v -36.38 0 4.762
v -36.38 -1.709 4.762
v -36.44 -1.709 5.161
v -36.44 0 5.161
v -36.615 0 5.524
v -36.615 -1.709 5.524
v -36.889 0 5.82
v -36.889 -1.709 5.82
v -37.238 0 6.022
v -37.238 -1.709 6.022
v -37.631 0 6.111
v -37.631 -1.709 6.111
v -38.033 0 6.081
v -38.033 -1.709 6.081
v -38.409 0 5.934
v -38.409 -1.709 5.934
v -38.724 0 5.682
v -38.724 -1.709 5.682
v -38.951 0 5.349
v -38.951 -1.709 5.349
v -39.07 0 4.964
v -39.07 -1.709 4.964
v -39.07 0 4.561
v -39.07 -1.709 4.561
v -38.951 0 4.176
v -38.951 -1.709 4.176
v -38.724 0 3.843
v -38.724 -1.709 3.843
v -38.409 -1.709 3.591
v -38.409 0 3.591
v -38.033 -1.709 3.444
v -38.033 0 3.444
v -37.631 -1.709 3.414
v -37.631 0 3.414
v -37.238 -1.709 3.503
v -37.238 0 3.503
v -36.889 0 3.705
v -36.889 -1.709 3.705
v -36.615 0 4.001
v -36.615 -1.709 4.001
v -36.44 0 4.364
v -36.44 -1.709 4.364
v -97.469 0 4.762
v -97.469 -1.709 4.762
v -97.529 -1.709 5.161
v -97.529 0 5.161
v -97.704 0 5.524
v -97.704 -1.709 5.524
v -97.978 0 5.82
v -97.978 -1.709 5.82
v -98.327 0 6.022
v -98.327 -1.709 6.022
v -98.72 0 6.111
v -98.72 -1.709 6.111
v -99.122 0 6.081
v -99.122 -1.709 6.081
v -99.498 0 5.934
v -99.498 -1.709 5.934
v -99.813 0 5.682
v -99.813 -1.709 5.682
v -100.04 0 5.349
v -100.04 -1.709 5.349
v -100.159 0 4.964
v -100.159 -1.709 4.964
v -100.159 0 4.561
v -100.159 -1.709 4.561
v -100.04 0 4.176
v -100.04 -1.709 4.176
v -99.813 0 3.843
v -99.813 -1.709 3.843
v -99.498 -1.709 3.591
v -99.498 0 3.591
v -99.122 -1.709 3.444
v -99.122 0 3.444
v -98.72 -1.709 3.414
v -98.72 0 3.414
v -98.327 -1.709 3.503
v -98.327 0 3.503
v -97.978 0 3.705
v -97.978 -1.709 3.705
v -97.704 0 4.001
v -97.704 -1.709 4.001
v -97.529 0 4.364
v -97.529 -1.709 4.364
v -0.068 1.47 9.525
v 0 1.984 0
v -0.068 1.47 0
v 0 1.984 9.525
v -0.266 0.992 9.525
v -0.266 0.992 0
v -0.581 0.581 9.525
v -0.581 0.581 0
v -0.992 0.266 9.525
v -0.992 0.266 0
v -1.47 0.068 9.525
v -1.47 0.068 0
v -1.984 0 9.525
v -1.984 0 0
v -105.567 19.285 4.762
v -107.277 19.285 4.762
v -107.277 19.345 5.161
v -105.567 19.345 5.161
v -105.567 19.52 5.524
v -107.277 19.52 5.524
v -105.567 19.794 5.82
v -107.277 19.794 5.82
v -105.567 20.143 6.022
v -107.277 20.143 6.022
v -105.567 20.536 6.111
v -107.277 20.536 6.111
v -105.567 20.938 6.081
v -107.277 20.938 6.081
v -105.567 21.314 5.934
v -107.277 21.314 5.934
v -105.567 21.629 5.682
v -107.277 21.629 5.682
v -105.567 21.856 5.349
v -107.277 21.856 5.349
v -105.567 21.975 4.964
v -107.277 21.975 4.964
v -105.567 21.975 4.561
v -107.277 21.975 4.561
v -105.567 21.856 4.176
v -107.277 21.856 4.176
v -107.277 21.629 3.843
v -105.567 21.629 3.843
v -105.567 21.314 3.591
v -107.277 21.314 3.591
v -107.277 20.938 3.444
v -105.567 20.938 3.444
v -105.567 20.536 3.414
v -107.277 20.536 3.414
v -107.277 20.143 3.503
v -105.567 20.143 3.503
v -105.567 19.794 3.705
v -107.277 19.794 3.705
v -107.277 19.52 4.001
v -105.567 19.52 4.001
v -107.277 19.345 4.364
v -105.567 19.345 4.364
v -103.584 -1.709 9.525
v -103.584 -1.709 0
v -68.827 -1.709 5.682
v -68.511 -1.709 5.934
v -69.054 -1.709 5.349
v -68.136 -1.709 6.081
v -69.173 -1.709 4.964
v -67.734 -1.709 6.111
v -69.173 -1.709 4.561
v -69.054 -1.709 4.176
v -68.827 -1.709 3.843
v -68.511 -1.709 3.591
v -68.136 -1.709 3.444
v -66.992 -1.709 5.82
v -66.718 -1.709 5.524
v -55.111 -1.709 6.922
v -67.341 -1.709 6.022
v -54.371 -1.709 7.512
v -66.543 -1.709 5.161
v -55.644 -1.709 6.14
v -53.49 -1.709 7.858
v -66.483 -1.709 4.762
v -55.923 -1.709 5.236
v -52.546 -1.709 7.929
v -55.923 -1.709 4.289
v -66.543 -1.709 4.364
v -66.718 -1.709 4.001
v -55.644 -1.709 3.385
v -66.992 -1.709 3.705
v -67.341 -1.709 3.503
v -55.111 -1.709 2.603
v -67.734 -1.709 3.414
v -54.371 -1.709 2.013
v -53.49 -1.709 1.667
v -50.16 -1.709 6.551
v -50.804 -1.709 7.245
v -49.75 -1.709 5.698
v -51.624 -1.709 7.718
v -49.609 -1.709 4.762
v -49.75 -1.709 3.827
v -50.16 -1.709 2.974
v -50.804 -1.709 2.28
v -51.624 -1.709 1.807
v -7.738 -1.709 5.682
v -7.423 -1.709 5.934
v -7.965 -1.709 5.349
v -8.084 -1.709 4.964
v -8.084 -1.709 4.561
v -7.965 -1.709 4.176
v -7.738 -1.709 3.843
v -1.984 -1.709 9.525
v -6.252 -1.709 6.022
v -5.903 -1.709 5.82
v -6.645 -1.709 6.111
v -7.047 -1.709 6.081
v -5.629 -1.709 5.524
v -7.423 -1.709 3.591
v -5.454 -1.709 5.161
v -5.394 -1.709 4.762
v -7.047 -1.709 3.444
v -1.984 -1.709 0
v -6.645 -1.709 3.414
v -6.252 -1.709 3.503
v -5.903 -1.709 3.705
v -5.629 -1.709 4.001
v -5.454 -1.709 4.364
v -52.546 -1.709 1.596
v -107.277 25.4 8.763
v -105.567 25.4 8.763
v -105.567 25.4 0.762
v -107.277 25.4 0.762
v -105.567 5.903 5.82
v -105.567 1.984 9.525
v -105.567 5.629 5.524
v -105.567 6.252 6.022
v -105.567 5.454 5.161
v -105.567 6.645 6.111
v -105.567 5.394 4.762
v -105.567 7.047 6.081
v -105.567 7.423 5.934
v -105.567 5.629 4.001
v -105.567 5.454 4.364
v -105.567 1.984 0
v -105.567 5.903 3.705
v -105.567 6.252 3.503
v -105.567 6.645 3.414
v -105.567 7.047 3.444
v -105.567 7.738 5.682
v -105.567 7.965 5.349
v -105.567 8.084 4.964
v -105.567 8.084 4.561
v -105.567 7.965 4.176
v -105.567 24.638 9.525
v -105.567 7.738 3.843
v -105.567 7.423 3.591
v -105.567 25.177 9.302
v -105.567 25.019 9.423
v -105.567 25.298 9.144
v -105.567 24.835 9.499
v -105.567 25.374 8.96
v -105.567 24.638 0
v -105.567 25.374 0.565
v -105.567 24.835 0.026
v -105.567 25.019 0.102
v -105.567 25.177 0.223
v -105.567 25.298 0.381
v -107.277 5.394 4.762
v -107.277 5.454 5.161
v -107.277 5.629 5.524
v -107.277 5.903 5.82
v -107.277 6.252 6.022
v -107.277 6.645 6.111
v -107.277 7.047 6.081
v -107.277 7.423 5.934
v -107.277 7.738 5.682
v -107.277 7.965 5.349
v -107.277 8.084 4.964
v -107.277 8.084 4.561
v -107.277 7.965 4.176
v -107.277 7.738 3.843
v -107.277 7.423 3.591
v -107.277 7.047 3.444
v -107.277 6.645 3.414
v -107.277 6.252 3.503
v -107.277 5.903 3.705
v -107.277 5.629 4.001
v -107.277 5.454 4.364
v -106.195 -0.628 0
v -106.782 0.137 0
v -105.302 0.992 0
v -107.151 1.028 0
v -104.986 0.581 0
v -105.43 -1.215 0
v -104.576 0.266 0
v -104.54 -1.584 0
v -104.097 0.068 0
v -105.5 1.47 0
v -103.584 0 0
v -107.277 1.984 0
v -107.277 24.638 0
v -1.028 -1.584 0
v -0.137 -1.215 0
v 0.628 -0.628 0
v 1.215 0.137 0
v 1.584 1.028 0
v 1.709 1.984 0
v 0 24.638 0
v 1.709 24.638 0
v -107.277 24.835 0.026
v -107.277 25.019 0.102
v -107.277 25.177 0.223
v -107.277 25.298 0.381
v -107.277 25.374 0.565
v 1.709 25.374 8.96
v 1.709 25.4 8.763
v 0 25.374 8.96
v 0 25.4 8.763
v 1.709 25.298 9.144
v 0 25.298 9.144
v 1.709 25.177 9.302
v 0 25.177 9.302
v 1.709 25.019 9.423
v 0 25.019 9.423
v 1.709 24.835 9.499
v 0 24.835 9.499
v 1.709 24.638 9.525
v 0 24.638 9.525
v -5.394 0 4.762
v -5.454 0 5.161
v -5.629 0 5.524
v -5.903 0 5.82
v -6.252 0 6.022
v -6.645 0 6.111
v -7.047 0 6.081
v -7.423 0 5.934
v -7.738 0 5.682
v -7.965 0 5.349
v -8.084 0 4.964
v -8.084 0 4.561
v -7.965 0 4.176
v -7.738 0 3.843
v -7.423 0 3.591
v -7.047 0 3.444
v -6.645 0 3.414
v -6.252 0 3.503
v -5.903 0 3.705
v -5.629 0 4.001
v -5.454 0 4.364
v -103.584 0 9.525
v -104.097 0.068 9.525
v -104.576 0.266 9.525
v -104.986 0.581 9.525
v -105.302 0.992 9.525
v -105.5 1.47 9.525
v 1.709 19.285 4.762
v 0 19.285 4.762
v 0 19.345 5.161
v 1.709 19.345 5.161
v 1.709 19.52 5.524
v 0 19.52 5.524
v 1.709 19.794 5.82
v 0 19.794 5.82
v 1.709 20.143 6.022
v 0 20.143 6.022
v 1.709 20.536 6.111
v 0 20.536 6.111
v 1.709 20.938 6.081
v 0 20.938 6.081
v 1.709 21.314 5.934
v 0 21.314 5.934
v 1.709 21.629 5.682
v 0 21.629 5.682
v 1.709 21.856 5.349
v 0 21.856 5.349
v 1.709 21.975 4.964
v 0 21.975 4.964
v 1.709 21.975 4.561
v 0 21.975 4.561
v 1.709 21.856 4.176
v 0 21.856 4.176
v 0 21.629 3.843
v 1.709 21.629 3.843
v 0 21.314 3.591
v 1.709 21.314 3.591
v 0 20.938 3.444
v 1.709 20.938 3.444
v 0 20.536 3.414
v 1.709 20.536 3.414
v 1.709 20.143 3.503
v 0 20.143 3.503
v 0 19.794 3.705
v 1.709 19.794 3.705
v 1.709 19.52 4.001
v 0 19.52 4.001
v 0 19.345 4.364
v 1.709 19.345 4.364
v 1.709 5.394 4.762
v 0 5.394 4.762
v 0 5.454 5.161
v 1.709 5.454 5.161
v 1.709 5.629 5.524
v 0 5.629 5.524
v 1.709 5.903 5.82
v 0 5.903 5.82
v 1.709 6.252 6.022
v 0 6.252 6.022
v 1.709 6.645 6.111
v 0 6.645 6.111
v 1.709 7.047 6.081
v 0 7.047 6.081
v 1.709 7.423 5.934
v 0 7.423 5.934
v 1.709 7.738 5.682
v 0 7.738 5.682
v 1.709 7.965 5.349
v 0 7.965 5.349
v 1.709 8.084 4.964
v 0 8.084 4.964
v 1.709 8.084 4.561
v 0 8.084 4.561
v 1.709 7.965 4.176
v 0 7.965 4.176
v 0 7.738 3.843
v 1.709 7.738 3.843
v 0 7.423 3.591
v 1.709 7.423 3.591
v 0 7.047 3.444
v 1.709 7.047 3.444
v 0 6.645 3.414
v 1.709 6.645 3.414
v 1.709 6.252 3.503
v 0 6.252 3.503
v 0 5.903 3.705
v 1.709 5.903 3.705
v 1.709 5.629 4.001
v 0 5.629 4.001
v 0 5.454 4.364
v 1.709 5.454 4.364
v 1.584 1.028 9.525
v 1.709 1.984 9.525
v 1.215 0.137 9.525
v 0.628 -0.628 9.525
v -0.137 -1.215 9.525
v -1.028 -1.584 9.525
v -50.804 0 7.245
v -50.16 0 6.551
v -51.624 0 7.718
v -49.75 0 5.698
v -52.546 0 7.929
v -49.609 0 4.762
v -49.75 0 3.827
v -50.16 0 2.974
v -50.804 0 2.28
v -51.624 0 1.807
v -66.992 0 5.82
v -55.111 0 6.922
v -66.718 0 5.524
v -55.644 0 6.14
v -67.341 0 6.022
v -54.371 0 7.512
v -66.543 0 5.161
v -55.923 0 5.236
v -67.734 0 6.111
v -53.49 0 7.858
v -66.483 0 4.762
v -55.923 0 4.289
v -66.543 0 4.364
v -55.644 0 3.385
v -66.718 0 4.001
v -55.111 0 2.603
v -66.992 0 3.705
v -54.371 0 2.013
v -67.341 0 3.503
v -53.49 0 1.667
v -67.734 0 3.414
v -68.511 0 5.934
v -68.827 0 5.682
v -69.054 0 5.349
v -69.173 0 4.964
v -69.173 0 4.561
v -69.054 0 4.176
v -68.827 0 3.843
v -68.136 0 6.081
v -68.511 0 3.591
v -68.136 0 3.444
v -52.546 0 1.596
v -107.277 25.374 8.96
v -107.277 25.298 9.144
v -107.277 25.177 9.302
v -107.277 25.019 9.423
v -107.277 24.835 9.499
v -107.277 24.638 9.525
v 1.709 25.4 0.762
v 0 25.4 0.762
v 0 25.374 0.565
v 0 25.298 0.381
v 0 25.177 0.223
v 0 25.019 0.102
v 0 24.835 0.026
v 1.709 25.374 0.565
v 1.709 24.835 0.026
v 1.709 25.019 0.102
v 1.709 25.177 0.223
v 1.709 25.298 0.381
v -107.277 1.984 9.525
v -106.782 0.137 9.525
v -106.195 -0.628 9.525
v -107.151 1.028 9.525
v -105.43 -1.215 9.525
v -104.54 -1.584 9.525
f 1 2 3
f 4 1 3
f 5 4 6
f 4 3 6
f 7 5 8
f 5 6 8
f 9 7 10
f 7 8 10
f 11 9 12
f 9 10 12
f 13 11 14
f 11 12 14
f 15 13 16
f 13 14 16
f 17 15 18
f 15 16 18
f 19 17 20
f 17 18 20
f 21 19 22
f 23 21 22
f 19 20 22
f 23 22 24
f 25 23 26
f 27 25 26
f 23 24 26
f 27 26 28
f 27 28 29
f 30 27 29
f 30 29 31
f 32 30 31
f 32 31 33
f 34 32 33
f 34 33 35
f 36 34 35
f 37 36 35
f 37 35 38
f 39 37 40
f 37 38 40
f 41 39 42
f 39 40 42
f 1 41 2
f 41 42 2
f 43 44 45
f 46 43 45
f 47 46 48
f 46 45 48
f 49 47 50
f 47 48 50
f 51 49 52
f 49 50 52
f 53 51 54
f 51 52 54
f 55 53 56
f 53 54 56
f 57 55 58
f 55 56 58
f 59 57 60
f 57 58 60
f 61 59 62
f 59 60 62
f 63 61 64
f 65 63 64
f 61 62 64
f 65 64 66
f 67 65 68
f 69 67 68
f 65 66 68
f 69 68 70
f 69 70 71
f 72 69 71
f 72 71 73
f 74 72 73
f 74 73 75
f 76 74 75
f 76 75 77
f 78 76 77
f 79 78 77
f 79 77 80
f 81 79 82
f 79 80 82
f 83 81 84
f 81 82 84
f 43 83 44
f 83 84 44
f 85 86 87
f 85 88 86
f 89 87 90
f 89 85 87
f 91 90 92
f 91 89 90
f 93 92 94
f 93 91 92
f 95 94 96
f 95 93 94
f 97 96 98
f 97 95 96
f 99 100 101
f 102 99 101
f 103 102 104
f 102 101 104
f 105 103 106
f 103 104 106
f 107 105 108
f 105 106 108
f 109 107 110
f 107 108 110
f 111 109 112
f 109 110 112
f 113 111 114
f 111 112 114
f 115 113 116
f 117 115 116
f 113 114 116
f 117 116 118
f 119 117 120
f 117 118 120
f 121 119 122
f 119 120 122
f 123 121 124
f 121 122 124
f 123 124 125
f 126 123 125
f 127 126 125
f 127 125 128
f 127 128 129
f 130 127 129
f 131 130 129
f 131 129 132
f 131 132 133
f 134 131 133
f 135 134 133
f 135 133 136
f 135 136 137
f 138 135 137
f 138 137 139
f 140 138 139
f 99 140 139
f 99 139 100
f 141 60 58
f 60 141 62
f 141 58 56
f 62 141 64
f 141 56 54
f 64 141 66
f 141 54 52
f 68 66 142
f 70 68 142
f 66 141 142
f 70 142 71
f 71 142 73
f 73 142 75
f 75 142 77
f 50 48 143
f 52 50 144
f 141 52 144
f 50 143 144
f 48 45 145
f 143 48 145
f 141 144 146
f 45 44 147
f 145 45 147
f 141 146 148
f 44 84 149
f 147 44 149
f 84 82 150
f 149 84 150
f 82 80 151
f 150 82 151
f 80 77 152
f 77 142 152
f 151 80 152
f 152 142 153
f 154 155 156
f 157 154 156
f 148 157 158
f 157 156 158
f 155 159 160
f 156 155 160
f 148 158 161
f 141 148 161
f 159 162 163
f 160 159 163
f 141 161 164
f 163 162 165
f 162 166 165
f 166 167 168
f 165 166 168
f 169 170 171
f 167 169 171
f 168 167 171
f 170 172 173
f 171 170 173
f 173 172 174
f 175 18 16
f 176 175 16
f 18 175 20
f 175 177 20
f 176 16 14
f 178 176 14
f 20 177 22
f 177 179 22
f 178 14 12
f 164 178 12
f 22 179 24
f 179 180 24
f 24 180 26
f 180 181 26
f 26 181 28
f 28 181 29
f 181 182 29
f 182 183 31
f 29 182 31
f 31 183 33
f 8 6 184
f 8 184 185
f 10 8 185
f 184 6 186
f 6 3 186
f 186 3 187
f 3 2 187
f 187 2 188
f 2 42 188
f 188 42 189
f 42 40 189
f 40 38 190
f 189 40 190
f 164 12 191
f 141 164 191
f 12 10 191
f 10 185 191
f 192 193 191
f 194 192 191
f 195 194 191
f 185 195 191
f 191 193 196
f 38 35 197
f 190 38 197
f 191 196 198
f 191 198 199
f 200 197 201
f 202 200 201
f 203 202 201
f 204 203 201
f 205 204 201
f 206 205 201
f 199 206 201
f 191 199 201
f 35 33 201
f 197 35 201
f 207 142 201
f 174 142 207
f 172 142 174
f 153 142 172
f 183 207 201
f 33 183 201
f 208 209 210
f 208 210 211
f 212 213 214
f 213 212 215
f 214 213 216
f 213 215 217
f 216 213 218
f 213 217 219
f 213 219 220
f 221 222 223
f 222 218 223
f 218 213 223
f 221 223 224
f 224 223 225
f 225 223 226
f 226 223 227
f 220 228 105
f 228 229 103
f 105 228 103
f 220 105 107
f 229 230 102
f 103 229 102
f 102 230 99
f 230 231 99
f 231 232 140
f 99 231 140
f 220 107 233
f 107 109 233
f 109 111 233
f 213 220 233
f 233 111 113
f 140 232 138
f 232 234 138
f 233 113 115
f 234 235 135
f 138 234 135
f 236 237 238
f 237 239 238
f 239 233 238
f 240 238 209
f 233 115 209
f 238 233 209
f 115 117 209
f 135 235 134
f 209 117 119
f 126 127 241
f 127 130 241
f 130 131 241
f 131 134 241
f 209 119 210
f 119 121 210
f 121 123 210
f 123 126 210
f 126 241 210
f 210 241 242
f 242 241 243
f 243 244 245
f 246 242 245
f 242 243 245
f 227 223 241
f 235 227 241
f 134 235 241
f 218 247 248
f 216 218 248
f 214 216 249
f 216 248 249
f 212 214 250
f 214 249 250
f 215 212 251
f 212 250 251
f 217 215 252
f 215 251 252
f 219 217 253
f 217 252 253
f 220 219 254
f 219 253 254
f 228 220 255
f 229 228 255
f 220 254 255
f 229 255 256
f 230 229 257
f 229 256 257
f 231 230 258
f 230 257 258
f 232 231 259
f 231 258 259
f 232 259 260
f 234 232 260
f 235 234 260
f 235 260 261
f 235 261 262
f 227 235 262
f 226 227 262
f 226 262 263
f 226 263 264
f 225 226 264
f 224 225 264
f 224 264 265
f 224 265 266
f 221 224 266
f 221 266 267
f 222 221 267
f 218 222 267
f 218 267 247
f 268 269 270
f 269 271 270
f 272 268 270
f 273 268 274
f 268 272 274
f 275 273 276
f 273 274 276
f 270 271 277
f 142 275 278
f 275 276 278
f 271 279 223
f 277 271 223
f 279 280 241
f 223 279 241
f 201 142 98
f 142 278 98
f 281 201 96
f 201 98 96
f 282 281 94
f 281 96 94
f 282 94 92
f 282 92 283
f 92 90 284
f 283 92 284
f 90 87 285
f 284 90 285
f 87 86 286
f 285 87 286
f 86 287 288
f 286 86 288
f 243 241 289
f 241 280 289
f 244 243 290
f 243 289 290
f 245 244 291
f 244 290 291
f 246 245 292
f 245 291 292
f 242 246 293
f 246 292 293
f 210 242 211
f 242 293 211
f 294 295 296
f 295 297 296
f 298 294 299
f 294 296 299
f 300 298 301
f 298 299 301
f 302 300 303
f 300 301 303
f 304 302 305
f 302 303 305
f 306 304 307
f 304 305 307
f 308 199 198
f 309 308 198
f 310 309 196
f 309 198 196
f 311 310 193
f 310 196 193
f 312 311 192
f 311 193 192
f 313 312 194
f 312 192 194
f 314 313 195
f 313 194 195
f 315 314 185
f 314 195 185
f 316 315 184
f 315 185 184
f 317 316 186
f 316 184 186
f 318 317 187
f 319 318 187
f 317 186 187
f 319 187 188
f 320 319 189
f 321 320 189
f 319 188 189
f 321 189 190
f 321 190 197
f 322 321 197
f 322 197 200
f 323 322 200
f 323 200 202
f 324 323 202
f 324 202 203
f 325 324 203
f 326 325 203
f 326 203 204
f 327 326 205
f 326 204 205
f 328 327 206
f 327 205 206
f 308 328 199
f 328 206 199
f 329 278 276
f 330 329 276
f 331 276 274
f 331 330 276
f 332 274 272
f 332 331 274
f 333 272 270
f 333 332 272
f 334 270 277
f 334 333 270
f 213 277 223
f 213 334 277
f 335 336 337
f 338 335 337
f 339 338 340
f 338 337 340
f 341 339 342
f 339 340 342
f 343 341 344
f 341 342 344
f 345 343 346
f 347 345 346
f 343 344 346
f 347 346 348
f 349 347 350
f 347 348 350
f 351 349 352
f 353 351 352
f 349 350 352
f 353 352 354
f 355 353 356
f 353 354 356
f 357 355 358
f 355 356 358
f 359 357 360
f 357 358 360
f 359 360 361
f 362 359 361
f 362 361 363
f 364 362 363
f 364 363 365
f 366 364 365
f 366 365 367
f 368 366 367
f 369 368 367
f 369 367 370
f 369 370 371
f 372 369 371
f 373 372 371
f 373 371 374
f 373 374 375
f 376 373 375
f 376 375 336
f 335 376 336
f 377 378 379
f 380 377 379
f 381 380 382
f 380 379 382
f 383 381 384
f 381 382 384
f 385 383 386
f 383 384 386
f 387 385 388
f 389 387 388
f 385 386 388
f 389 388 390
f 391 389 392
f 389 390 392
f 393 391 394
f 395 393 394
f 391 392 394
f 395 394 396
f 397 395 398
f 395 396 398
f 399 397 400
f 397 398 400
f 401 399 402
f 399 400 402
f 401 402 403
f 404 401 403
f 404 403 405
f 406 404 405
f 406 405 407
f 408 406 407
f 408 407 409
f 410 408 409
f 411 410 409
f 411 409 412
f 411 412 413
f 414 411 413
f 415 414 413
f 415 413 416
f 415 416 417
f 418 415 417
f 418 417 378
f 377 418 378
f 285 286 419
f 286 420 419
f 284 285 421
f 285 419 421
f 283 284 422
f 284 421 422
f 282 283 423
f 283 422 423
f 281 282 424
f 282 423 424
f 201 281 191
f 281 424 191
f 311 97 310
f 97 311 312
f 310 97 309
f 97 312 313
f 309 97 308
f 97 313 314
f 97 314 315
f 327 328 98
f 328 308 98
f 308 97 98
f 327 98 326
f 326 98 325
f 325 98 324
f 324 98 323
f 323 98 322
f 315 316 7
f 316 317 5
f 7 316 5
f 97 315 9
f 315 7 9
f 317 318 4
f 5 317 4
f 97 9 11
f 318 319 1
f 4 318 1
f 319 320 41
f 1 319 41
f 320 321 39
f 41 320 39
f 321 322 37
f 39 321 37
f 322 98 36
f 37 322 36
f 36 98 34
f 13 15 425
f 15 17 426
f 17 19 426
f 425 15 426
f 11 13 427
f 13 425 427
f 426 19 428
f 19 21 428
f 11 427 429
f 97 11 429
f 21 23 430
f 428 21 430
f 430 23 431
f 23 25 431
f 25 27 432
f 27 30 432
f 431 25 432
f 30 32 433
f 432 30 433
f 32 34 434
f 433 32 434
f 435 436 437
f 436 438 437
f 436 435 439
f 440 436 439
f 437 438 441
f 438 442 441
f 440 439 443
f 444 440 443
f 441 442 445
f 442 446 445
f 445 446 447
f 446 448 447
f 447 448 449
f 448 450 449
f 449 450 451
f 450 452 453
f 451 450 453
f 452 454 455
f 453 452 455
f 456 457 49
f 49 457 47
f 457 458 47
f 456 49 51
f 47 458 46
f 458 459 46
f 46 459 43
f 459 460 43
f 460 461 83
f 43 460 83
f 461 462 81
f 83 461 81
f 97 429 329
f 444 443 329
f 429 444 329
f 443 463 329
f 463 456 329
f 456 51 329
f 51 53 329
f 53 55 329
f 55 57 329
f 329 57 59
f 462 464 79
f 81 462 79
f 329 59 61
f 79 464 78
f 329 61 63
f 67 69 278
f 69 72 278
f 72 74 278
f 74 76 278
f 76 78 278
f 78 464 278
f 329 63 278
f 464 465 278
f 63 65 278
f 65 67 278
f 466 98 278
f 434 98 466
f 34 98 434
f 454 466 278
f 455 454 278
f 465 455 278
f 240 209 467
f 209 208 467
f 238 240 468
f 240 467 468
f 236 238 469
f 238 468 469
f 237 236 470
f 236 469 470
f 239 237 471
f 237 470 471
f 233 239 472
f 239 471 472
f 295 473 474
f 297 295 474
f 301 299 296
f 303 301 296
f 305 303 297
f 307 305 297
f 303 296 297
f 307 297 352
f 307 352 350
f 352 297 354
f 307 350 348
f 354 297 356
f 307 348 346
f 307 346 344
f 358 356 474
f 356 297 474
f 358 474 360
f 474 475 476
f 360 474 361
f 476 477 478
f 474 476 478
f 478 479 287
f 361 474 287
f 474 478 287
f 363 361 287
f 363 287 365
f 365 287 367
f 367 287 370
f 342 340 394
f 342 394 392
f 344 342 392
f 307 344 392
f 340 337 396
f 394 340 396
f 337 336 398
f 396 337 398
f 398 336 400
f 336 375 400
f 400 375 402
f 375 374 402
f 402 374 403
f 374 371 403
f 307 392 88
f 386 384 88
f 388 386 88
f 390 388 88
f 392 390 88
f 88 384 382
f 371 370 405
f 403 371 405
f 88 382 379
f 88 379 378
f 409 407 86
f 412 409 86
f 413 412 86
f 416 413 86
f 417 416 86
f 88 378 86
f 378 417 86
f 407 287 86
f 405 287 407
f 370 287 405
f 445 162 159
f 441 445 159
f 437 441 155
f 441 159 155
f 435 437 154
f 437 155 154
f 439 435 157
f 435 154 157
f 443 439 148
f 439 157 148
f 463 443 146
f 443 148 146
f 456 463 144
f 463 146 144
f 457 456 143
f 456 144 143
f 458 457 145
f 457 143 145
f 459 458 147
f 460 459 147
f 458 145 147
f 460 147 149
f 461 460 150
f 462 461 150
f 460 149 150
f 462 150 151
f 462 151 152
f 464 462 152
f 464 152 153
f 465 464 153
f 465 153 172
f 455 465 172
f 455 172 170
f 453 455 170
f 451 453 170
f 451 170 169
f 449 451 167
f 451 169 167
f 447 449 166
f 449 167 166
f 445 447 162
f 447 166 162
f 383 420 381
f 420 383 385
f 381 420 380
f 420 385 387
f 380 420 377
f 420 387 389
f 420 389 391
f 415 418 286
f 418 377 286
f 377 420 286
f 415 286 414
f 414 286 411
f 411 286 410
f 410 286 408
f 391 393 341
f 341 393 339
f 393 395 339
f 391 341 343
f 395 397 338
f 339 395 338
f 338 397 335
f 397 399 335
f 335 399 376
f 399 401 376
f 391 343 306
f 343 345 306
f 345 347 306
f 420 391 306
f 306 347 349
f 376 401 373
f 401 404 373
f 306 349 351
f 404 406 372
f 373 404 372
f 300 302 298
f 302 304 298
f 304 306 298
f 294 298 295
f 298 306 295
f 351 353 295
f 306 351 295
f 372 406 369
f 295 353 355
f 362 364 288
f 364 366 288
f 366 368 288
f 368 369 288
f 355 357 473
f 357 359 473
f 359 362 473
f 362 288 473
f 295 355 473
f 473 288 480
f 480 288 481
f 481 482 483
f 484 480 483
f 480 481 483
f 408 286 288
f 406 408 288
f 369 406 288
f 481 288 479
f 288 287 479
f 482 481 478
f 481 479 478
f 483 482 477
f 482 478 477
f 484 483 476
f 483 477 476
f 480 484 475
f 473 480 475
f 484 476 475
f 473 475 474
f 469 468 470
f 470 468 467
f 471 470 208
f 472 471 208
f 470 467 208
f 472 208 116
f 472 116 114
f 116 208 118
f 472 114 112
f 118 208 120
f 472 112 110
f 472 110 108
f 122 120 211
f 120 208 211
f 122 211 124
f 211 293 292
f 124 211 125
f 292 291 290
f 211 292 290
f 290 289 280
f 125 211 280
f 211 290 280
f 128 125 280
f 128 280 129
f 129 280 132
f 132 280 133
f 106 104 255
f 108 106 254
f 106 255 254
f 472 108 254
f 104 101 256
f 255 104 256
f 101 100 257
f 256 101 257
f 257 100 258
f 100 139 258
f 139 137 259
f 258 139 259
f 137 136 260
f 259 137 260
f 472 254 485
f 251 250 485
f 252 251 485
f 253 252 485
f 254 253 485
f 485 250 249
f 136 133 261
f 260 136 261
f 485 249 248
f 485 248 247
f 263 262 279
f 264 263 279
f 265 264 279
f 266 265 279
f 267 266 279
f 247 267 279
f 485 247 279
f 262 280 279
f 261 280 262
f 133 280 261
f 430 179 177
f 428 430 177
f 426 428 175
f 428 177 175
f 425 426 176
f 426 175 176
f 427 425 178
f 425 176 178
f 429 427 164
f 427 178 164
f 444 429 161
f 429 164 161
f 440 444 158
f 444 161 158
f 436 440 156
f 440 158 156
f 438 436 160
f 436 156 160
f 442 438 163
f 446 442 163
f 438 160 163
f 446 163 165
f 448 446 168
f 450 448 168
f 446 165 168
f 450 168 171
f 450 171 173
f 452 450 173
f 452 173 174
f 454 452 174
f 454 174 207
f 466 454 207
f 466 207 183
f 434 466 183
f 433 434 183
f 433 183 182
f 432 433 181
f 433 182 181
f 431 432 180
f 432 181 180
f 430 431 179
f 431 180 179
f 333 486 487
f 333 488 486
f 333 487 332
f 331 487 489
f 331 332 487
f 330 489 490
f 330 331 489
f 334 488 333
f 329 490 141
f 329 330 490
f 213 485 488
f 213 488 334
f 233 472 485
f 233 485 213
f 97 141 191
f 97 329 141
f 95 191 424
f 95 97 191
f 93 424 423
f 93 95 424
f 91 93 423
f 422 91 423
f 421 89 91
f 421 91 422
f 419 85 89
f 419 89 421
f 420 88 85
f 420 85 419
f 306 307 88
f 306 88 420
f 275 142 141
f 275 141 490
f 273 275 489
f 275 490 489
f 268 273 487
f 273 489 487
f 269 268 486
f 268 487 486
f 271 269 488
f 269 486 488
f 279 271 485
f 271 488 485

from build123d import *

# Parameters (mm, degrees)
F1_DEPTH = 9.525
F2_R     = 1.98374
F3_R     = 3.69316
F4_R     = 1.35255
F5_DEPTH = 108.98632
F6_R     = 1.35255
F6_R_2   = 3.175
F7_DEPTH = 1.70942
F8_R     = 0.762


with BuildPart() as f1:
    # F0 (on Top) → F1 (new body)
    with BuildSketch(Plane.XY):
        Polygon((0, 25.4), (0, 0), (-105.56748, 0), (-105.56748, 25.4), (-107.2769, 25.4), (-107.2769, -1.70942), (1.70942, -1.70942), (1.70942, 25.4), align=None)
    extrude(amount=F1_DEPTH)

    # F2
    f2_edges = [f1.edges().sort_by_distance(p)[0] for p in [
        (0, 0, 4.7625),
        (-105.56748, 0, 4.7625),
    ]]
    fillet(f2_edges, radius=F2_R)

    # F3
    f3_edges = [f1.edges().sort_by_distance(p)[0] for p in [
        (1.70942, -1.70942, 4.7625),
        (-107.2769, -1.70942, 4.7625),
    ]]
    fillet(f3_edges, radius=F3_R)

    # F4 (on face) → F5 (cut, through all)
    with BuildSketch(Plane(origin=(-107.2769, 0, 0), x_dir=(0, -1, 0), z_dir=(-1, 0, 0))):
        with Locations((-20.6375, 4.7625)):
            Circle(F4_R)
        with Locations((-6.74624, 4.7625)):
            Circle(F4_R)
    extrude(amount=-F5_DEPTH, mode=Mode.SUBTRACT)

    # F6 (on face) → F7 (cut, through all)
    with BuildSketch(Plane.XZ.offset(1.70942)):
        with Locations((-98.82124, 4.7625)):
            Circle(F6_R)
        with Locations((-6.74624, 4.7625)):
            Circle(F6_R)
        with Locations((-67.8351831, 4.7625)):
            Circle(F6_R)
        with Locations((-37.7322969, 4.7625)):
            Circle(F6_R)
        with Locations((-52.78374, 4.7625)):
            Circle(F6_R_2)
    extrude(amount=-F7_DEPTH, mode=Mode.SUBTRACT)

    # F8
    f8_edges = [f1.edges().sort_by_distance(p)[0] for p in [
        (-106.42219, 25.4, 9.525),
        (-106.42219, 25.4, 0),
        (0.85471, 25.4, 9.525),
        (0.85471, 25.4, 0),
    ]]
    fillet(f8_edges, radius=F8_R)


solid = f1.part
